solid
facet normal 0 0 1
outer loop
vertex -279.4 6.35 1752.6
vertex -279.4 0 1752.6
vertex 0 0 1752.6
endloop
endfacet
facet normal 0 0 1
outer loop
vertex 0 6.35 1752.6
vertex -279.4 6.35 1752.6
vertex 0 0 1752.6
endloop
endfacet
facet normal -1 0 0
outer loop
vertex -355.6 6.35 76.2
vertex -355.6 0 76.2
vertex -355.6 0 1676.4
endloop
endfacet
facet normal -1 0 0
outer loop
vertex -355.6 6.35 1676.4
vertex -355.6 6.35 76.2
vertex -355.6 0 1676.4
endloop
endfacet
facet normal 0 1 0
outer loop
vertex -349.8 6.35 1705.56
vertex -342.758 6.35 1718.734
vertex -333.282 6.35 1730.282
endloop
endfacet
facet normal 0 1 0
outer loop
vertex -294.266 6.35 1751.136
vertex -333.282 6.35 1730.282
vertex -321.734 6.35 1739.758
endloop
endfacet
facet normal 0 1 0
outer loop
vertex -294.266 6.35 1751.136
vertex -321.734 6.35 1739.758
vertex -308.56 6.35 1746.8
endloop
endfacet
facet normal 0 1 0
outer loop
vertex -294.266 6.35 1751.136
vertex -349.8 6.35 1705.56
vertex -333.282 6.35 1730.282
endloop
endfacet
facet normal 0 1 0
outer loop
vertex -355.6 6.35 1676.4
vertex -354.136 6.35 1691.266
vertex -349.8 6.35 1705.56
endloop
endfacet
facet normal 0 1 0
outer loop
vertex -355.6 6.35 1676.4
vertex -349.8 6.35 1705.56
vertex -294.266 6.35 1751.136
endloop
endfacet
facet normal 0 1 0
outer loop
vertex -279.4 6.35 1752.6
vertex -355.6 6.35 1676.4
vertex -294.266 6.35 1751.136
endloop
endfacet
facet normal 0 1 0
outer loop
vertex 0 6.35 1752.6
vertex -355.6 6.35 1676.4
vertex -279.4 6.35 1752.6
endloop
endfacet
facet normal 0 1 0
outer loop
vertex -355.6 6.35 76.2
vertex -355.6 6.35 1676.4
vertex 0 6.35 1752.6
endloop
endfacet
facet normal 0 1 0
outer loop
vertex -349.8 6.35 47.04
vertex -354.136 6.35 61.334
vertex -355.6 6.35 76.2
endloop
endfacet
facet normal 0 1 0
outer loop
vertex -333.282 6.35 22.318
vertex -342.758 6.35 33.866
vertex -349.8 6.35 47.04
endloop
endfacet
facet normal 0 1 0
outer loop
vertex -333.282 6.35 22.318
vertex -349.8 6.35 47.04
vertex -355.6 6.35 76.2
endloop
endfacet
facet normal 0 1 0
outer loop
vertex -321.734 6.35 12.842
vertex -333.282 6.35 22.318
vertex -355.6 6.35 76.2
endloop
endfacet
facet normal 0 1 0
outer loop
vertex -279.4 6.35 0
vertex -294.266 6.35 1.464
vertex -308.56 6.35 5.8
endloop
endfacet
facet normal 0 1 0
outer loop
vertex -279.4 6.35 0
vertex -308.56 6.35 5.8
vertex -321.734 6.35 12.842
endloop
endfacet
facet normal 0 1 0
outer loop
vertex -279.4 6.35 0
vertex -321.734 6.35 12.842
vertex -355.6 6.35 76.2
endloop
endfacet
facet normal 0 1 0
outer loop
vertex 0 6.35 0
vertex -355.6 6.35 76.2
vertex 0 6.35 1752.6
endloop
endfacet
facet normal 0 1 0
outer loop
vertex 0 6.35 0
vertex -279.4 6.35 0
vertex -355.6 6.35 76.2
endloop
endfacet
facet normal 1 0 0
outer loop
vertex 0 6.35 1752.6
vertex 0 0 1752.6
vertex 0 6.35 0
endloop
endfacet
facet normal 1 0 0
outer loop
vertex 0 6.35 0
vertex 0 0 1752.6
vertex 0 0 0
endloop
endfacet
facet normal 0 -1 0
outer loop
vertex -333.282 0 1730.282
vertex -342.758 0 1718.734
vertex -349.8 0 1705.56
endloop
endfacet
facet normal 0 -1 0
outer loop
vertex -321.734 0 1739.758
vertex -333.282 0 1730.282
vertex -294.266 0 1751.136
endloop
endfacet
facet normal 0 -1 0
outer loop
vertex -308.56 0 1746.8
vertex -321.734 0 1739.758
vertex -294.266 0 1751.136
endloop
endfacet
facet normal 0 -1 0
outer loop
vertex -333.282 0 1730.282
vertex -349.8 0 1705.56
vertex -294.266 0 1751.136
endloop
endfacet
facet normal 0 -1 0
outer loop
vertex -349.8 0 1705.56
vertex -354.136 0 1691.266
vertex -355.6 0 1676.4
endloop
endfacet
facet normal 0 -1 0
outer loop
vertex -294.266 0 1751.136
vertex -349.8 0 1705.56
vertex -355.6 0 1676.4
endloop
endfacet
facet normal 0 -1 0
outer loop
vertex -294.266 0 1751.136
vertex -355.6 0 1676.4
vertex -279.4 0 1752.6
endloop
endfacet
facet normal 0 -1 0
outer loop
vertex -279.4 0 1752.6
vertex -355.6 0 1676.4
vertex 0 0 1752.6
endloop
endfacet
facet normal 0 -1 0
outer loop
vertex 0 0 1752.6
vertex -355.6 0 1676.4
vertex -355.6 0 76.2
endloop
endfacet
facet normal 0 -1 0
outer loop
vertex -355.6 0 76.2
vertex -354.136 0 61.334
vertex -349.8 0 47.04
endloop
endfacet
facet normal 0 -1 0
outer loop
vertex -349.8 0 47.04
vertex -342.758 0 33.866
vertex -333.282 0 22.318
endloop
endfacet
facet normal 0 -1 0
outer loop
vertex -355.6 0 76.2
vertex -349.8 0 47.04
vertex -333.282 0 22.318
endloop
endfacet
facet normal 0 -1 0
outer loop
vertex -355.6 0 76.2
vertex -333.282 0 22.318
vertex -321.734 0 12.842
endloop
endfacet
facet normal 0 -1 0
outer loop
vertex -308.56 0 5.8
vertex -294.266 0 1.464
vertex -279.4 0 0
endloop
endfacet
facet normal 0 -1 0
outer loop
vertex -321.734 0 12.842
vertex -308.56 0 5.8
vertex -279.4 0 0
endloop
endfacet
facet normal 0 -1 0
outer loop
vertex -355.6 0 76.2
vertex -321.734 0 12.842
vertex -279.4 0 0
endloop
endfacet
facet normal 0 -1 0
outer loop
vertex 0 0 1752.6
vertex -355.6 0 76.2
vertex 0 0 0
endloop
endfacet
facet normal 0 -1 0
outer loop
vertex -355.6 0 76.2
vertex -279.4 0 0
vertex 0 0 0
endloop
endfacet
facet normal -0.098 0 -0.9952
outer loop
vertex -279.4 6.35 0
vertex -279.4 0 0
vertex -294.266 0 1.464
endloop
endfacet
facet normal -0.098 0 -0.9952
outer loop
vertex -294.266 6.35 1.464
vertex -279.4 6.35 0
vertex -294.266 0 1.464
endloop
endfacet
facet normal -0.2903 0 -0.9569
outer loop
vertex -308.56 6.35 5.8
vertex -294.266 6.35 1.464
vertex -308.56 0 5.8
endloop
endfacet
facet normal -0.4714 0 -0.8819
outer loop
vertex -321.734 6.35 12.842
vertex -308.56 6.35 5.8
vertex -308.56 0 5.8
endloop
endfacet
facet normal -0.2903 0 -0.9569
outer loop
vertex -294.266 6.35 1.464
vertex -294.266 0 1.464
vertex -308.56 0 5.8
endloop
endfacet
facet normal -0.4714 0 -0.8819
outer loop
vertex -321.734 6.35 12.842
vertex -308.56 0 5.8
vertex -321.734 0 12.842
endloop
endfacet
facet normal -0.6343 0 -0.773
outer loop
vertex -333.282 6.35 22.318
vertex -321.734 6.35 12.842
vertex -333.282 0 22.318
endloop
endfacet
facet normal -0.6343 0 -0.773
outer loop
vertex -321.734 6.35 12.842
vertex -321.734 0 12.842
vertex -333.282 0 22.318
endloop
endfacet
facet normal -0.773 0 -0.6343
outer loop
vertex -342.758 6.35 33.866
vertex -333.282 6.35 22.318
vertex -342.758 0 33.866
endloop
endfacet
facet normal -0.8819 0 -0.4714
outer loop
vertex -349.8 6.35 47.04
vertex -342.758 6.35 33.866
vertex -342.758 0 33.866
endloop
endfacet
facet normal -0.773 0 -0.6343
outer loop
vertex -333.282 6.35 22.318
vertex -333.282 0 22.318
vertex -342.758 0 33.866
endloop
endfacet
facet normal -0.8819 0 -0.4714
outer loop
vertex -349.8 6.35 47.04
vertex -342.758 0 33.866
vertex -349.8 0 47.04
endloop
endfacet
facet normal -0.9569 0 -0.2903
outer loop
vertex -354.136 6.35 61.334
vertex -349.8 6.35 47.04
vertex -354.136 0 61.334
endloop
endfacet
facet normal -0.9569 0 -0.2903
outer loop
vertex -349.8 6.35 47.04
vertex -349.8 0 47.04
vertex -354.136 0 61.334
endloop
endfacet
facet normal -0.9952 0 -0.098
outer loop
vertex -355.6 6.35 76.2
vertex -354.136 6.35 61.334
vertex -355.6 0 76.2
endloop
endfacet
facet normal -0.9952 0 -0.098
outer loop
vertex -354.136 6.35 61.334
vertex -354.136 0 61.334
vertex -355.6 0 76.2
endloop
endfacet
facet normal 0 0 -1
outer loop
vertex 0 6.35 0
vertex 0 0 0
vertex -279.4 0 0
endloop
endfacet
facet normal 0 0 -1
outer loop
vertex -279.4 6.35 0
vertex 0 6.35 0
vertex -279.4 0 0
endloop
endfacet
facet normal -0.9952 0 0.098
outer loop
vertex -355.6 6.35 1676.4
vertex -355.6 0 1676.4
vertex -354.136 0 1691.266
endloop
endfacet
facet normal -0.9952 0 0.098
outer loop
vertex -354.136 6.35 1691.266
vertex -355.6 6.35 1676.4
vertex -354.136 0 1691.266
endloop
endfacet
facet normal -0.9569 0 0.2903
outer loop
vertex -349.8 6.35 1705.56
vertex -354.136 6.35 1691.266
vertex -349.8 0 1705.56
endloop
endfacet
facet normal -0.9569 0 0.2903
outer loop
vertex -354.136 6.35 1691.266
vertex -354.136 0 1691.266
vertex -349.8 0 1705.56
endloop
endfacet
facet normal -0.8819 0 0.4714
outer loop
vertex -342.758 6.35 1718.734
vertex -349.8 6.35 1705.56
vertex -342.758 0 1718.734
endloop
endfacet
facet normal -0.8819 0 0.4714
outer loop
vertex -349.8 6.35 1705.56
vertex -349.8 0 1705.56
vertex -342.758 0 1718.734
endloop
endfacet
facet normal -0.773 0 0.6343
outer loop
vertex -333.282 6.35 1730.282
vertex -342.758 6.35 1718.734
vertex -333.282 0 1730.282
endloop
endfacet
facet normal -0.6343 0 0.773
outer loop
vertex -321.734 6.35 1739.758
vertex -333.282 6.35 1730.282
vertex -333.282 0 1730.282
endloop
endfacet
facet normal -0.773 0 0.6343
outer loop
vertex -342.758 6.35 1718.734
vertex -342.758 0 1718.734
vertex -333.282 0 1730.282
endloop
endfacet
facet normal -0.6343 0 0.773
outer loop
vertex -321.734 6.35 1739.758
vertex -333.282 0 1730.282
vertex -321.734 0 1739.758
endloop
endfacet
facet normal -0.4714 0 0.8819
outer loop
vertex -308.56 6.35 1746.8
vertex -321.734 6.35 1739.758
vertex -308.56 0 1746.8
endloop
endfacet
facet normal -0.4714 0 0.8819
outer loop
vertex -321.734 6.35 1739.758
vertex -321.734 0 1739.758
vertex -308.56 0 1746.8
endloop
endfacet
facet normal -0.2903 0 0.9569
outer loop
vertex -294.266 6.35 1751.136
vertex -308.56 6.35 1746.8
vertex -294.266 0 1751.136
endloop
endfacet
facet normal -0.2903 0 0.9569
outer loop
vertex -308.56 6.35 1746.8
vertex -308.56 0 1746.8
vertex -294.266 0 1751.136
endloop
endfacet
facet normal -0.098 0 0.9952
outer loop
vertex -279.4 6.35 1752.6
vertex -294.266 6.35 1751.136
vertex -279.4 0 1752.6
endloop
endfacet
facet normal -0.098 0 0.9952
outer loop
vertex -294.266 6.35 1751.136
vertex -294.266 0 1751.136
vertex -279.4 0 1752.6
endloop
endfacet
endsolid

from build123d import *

# Parameters (mm, degrees)
BOSS_EXTRUDE1_DEPTH = 6.35


with BuildPart() as part:
    # Sketch1 → Boss-Extrude1 (new body)
    with BuildSketch(Plane(origin=(0, 0, 0), x_dir=(1, 0, 0), z_dir=(0, 1, 0))):
        with BuildLine():
            Line((0, 0), (-279.4, 0))
            ThreePointArc((-279.4, 0), (-333.281536726, -22.318463274), (-355.6, -76.2))
            Line((-355.6, -76.2), (-355.6, -1676.4))
            ThreePointArc((-355.6, -1676.4), (-333.281536726, -1730.281536726), (-279.4, -1752.6))
            Line((-279.4, -1752.6), (0, -1752.6))
            Line((0, -1752.6), (0, 0))
        make_face()
    extrude(amount=BOSS_EXTRUDE1_DEPTH)


solid = part.part
